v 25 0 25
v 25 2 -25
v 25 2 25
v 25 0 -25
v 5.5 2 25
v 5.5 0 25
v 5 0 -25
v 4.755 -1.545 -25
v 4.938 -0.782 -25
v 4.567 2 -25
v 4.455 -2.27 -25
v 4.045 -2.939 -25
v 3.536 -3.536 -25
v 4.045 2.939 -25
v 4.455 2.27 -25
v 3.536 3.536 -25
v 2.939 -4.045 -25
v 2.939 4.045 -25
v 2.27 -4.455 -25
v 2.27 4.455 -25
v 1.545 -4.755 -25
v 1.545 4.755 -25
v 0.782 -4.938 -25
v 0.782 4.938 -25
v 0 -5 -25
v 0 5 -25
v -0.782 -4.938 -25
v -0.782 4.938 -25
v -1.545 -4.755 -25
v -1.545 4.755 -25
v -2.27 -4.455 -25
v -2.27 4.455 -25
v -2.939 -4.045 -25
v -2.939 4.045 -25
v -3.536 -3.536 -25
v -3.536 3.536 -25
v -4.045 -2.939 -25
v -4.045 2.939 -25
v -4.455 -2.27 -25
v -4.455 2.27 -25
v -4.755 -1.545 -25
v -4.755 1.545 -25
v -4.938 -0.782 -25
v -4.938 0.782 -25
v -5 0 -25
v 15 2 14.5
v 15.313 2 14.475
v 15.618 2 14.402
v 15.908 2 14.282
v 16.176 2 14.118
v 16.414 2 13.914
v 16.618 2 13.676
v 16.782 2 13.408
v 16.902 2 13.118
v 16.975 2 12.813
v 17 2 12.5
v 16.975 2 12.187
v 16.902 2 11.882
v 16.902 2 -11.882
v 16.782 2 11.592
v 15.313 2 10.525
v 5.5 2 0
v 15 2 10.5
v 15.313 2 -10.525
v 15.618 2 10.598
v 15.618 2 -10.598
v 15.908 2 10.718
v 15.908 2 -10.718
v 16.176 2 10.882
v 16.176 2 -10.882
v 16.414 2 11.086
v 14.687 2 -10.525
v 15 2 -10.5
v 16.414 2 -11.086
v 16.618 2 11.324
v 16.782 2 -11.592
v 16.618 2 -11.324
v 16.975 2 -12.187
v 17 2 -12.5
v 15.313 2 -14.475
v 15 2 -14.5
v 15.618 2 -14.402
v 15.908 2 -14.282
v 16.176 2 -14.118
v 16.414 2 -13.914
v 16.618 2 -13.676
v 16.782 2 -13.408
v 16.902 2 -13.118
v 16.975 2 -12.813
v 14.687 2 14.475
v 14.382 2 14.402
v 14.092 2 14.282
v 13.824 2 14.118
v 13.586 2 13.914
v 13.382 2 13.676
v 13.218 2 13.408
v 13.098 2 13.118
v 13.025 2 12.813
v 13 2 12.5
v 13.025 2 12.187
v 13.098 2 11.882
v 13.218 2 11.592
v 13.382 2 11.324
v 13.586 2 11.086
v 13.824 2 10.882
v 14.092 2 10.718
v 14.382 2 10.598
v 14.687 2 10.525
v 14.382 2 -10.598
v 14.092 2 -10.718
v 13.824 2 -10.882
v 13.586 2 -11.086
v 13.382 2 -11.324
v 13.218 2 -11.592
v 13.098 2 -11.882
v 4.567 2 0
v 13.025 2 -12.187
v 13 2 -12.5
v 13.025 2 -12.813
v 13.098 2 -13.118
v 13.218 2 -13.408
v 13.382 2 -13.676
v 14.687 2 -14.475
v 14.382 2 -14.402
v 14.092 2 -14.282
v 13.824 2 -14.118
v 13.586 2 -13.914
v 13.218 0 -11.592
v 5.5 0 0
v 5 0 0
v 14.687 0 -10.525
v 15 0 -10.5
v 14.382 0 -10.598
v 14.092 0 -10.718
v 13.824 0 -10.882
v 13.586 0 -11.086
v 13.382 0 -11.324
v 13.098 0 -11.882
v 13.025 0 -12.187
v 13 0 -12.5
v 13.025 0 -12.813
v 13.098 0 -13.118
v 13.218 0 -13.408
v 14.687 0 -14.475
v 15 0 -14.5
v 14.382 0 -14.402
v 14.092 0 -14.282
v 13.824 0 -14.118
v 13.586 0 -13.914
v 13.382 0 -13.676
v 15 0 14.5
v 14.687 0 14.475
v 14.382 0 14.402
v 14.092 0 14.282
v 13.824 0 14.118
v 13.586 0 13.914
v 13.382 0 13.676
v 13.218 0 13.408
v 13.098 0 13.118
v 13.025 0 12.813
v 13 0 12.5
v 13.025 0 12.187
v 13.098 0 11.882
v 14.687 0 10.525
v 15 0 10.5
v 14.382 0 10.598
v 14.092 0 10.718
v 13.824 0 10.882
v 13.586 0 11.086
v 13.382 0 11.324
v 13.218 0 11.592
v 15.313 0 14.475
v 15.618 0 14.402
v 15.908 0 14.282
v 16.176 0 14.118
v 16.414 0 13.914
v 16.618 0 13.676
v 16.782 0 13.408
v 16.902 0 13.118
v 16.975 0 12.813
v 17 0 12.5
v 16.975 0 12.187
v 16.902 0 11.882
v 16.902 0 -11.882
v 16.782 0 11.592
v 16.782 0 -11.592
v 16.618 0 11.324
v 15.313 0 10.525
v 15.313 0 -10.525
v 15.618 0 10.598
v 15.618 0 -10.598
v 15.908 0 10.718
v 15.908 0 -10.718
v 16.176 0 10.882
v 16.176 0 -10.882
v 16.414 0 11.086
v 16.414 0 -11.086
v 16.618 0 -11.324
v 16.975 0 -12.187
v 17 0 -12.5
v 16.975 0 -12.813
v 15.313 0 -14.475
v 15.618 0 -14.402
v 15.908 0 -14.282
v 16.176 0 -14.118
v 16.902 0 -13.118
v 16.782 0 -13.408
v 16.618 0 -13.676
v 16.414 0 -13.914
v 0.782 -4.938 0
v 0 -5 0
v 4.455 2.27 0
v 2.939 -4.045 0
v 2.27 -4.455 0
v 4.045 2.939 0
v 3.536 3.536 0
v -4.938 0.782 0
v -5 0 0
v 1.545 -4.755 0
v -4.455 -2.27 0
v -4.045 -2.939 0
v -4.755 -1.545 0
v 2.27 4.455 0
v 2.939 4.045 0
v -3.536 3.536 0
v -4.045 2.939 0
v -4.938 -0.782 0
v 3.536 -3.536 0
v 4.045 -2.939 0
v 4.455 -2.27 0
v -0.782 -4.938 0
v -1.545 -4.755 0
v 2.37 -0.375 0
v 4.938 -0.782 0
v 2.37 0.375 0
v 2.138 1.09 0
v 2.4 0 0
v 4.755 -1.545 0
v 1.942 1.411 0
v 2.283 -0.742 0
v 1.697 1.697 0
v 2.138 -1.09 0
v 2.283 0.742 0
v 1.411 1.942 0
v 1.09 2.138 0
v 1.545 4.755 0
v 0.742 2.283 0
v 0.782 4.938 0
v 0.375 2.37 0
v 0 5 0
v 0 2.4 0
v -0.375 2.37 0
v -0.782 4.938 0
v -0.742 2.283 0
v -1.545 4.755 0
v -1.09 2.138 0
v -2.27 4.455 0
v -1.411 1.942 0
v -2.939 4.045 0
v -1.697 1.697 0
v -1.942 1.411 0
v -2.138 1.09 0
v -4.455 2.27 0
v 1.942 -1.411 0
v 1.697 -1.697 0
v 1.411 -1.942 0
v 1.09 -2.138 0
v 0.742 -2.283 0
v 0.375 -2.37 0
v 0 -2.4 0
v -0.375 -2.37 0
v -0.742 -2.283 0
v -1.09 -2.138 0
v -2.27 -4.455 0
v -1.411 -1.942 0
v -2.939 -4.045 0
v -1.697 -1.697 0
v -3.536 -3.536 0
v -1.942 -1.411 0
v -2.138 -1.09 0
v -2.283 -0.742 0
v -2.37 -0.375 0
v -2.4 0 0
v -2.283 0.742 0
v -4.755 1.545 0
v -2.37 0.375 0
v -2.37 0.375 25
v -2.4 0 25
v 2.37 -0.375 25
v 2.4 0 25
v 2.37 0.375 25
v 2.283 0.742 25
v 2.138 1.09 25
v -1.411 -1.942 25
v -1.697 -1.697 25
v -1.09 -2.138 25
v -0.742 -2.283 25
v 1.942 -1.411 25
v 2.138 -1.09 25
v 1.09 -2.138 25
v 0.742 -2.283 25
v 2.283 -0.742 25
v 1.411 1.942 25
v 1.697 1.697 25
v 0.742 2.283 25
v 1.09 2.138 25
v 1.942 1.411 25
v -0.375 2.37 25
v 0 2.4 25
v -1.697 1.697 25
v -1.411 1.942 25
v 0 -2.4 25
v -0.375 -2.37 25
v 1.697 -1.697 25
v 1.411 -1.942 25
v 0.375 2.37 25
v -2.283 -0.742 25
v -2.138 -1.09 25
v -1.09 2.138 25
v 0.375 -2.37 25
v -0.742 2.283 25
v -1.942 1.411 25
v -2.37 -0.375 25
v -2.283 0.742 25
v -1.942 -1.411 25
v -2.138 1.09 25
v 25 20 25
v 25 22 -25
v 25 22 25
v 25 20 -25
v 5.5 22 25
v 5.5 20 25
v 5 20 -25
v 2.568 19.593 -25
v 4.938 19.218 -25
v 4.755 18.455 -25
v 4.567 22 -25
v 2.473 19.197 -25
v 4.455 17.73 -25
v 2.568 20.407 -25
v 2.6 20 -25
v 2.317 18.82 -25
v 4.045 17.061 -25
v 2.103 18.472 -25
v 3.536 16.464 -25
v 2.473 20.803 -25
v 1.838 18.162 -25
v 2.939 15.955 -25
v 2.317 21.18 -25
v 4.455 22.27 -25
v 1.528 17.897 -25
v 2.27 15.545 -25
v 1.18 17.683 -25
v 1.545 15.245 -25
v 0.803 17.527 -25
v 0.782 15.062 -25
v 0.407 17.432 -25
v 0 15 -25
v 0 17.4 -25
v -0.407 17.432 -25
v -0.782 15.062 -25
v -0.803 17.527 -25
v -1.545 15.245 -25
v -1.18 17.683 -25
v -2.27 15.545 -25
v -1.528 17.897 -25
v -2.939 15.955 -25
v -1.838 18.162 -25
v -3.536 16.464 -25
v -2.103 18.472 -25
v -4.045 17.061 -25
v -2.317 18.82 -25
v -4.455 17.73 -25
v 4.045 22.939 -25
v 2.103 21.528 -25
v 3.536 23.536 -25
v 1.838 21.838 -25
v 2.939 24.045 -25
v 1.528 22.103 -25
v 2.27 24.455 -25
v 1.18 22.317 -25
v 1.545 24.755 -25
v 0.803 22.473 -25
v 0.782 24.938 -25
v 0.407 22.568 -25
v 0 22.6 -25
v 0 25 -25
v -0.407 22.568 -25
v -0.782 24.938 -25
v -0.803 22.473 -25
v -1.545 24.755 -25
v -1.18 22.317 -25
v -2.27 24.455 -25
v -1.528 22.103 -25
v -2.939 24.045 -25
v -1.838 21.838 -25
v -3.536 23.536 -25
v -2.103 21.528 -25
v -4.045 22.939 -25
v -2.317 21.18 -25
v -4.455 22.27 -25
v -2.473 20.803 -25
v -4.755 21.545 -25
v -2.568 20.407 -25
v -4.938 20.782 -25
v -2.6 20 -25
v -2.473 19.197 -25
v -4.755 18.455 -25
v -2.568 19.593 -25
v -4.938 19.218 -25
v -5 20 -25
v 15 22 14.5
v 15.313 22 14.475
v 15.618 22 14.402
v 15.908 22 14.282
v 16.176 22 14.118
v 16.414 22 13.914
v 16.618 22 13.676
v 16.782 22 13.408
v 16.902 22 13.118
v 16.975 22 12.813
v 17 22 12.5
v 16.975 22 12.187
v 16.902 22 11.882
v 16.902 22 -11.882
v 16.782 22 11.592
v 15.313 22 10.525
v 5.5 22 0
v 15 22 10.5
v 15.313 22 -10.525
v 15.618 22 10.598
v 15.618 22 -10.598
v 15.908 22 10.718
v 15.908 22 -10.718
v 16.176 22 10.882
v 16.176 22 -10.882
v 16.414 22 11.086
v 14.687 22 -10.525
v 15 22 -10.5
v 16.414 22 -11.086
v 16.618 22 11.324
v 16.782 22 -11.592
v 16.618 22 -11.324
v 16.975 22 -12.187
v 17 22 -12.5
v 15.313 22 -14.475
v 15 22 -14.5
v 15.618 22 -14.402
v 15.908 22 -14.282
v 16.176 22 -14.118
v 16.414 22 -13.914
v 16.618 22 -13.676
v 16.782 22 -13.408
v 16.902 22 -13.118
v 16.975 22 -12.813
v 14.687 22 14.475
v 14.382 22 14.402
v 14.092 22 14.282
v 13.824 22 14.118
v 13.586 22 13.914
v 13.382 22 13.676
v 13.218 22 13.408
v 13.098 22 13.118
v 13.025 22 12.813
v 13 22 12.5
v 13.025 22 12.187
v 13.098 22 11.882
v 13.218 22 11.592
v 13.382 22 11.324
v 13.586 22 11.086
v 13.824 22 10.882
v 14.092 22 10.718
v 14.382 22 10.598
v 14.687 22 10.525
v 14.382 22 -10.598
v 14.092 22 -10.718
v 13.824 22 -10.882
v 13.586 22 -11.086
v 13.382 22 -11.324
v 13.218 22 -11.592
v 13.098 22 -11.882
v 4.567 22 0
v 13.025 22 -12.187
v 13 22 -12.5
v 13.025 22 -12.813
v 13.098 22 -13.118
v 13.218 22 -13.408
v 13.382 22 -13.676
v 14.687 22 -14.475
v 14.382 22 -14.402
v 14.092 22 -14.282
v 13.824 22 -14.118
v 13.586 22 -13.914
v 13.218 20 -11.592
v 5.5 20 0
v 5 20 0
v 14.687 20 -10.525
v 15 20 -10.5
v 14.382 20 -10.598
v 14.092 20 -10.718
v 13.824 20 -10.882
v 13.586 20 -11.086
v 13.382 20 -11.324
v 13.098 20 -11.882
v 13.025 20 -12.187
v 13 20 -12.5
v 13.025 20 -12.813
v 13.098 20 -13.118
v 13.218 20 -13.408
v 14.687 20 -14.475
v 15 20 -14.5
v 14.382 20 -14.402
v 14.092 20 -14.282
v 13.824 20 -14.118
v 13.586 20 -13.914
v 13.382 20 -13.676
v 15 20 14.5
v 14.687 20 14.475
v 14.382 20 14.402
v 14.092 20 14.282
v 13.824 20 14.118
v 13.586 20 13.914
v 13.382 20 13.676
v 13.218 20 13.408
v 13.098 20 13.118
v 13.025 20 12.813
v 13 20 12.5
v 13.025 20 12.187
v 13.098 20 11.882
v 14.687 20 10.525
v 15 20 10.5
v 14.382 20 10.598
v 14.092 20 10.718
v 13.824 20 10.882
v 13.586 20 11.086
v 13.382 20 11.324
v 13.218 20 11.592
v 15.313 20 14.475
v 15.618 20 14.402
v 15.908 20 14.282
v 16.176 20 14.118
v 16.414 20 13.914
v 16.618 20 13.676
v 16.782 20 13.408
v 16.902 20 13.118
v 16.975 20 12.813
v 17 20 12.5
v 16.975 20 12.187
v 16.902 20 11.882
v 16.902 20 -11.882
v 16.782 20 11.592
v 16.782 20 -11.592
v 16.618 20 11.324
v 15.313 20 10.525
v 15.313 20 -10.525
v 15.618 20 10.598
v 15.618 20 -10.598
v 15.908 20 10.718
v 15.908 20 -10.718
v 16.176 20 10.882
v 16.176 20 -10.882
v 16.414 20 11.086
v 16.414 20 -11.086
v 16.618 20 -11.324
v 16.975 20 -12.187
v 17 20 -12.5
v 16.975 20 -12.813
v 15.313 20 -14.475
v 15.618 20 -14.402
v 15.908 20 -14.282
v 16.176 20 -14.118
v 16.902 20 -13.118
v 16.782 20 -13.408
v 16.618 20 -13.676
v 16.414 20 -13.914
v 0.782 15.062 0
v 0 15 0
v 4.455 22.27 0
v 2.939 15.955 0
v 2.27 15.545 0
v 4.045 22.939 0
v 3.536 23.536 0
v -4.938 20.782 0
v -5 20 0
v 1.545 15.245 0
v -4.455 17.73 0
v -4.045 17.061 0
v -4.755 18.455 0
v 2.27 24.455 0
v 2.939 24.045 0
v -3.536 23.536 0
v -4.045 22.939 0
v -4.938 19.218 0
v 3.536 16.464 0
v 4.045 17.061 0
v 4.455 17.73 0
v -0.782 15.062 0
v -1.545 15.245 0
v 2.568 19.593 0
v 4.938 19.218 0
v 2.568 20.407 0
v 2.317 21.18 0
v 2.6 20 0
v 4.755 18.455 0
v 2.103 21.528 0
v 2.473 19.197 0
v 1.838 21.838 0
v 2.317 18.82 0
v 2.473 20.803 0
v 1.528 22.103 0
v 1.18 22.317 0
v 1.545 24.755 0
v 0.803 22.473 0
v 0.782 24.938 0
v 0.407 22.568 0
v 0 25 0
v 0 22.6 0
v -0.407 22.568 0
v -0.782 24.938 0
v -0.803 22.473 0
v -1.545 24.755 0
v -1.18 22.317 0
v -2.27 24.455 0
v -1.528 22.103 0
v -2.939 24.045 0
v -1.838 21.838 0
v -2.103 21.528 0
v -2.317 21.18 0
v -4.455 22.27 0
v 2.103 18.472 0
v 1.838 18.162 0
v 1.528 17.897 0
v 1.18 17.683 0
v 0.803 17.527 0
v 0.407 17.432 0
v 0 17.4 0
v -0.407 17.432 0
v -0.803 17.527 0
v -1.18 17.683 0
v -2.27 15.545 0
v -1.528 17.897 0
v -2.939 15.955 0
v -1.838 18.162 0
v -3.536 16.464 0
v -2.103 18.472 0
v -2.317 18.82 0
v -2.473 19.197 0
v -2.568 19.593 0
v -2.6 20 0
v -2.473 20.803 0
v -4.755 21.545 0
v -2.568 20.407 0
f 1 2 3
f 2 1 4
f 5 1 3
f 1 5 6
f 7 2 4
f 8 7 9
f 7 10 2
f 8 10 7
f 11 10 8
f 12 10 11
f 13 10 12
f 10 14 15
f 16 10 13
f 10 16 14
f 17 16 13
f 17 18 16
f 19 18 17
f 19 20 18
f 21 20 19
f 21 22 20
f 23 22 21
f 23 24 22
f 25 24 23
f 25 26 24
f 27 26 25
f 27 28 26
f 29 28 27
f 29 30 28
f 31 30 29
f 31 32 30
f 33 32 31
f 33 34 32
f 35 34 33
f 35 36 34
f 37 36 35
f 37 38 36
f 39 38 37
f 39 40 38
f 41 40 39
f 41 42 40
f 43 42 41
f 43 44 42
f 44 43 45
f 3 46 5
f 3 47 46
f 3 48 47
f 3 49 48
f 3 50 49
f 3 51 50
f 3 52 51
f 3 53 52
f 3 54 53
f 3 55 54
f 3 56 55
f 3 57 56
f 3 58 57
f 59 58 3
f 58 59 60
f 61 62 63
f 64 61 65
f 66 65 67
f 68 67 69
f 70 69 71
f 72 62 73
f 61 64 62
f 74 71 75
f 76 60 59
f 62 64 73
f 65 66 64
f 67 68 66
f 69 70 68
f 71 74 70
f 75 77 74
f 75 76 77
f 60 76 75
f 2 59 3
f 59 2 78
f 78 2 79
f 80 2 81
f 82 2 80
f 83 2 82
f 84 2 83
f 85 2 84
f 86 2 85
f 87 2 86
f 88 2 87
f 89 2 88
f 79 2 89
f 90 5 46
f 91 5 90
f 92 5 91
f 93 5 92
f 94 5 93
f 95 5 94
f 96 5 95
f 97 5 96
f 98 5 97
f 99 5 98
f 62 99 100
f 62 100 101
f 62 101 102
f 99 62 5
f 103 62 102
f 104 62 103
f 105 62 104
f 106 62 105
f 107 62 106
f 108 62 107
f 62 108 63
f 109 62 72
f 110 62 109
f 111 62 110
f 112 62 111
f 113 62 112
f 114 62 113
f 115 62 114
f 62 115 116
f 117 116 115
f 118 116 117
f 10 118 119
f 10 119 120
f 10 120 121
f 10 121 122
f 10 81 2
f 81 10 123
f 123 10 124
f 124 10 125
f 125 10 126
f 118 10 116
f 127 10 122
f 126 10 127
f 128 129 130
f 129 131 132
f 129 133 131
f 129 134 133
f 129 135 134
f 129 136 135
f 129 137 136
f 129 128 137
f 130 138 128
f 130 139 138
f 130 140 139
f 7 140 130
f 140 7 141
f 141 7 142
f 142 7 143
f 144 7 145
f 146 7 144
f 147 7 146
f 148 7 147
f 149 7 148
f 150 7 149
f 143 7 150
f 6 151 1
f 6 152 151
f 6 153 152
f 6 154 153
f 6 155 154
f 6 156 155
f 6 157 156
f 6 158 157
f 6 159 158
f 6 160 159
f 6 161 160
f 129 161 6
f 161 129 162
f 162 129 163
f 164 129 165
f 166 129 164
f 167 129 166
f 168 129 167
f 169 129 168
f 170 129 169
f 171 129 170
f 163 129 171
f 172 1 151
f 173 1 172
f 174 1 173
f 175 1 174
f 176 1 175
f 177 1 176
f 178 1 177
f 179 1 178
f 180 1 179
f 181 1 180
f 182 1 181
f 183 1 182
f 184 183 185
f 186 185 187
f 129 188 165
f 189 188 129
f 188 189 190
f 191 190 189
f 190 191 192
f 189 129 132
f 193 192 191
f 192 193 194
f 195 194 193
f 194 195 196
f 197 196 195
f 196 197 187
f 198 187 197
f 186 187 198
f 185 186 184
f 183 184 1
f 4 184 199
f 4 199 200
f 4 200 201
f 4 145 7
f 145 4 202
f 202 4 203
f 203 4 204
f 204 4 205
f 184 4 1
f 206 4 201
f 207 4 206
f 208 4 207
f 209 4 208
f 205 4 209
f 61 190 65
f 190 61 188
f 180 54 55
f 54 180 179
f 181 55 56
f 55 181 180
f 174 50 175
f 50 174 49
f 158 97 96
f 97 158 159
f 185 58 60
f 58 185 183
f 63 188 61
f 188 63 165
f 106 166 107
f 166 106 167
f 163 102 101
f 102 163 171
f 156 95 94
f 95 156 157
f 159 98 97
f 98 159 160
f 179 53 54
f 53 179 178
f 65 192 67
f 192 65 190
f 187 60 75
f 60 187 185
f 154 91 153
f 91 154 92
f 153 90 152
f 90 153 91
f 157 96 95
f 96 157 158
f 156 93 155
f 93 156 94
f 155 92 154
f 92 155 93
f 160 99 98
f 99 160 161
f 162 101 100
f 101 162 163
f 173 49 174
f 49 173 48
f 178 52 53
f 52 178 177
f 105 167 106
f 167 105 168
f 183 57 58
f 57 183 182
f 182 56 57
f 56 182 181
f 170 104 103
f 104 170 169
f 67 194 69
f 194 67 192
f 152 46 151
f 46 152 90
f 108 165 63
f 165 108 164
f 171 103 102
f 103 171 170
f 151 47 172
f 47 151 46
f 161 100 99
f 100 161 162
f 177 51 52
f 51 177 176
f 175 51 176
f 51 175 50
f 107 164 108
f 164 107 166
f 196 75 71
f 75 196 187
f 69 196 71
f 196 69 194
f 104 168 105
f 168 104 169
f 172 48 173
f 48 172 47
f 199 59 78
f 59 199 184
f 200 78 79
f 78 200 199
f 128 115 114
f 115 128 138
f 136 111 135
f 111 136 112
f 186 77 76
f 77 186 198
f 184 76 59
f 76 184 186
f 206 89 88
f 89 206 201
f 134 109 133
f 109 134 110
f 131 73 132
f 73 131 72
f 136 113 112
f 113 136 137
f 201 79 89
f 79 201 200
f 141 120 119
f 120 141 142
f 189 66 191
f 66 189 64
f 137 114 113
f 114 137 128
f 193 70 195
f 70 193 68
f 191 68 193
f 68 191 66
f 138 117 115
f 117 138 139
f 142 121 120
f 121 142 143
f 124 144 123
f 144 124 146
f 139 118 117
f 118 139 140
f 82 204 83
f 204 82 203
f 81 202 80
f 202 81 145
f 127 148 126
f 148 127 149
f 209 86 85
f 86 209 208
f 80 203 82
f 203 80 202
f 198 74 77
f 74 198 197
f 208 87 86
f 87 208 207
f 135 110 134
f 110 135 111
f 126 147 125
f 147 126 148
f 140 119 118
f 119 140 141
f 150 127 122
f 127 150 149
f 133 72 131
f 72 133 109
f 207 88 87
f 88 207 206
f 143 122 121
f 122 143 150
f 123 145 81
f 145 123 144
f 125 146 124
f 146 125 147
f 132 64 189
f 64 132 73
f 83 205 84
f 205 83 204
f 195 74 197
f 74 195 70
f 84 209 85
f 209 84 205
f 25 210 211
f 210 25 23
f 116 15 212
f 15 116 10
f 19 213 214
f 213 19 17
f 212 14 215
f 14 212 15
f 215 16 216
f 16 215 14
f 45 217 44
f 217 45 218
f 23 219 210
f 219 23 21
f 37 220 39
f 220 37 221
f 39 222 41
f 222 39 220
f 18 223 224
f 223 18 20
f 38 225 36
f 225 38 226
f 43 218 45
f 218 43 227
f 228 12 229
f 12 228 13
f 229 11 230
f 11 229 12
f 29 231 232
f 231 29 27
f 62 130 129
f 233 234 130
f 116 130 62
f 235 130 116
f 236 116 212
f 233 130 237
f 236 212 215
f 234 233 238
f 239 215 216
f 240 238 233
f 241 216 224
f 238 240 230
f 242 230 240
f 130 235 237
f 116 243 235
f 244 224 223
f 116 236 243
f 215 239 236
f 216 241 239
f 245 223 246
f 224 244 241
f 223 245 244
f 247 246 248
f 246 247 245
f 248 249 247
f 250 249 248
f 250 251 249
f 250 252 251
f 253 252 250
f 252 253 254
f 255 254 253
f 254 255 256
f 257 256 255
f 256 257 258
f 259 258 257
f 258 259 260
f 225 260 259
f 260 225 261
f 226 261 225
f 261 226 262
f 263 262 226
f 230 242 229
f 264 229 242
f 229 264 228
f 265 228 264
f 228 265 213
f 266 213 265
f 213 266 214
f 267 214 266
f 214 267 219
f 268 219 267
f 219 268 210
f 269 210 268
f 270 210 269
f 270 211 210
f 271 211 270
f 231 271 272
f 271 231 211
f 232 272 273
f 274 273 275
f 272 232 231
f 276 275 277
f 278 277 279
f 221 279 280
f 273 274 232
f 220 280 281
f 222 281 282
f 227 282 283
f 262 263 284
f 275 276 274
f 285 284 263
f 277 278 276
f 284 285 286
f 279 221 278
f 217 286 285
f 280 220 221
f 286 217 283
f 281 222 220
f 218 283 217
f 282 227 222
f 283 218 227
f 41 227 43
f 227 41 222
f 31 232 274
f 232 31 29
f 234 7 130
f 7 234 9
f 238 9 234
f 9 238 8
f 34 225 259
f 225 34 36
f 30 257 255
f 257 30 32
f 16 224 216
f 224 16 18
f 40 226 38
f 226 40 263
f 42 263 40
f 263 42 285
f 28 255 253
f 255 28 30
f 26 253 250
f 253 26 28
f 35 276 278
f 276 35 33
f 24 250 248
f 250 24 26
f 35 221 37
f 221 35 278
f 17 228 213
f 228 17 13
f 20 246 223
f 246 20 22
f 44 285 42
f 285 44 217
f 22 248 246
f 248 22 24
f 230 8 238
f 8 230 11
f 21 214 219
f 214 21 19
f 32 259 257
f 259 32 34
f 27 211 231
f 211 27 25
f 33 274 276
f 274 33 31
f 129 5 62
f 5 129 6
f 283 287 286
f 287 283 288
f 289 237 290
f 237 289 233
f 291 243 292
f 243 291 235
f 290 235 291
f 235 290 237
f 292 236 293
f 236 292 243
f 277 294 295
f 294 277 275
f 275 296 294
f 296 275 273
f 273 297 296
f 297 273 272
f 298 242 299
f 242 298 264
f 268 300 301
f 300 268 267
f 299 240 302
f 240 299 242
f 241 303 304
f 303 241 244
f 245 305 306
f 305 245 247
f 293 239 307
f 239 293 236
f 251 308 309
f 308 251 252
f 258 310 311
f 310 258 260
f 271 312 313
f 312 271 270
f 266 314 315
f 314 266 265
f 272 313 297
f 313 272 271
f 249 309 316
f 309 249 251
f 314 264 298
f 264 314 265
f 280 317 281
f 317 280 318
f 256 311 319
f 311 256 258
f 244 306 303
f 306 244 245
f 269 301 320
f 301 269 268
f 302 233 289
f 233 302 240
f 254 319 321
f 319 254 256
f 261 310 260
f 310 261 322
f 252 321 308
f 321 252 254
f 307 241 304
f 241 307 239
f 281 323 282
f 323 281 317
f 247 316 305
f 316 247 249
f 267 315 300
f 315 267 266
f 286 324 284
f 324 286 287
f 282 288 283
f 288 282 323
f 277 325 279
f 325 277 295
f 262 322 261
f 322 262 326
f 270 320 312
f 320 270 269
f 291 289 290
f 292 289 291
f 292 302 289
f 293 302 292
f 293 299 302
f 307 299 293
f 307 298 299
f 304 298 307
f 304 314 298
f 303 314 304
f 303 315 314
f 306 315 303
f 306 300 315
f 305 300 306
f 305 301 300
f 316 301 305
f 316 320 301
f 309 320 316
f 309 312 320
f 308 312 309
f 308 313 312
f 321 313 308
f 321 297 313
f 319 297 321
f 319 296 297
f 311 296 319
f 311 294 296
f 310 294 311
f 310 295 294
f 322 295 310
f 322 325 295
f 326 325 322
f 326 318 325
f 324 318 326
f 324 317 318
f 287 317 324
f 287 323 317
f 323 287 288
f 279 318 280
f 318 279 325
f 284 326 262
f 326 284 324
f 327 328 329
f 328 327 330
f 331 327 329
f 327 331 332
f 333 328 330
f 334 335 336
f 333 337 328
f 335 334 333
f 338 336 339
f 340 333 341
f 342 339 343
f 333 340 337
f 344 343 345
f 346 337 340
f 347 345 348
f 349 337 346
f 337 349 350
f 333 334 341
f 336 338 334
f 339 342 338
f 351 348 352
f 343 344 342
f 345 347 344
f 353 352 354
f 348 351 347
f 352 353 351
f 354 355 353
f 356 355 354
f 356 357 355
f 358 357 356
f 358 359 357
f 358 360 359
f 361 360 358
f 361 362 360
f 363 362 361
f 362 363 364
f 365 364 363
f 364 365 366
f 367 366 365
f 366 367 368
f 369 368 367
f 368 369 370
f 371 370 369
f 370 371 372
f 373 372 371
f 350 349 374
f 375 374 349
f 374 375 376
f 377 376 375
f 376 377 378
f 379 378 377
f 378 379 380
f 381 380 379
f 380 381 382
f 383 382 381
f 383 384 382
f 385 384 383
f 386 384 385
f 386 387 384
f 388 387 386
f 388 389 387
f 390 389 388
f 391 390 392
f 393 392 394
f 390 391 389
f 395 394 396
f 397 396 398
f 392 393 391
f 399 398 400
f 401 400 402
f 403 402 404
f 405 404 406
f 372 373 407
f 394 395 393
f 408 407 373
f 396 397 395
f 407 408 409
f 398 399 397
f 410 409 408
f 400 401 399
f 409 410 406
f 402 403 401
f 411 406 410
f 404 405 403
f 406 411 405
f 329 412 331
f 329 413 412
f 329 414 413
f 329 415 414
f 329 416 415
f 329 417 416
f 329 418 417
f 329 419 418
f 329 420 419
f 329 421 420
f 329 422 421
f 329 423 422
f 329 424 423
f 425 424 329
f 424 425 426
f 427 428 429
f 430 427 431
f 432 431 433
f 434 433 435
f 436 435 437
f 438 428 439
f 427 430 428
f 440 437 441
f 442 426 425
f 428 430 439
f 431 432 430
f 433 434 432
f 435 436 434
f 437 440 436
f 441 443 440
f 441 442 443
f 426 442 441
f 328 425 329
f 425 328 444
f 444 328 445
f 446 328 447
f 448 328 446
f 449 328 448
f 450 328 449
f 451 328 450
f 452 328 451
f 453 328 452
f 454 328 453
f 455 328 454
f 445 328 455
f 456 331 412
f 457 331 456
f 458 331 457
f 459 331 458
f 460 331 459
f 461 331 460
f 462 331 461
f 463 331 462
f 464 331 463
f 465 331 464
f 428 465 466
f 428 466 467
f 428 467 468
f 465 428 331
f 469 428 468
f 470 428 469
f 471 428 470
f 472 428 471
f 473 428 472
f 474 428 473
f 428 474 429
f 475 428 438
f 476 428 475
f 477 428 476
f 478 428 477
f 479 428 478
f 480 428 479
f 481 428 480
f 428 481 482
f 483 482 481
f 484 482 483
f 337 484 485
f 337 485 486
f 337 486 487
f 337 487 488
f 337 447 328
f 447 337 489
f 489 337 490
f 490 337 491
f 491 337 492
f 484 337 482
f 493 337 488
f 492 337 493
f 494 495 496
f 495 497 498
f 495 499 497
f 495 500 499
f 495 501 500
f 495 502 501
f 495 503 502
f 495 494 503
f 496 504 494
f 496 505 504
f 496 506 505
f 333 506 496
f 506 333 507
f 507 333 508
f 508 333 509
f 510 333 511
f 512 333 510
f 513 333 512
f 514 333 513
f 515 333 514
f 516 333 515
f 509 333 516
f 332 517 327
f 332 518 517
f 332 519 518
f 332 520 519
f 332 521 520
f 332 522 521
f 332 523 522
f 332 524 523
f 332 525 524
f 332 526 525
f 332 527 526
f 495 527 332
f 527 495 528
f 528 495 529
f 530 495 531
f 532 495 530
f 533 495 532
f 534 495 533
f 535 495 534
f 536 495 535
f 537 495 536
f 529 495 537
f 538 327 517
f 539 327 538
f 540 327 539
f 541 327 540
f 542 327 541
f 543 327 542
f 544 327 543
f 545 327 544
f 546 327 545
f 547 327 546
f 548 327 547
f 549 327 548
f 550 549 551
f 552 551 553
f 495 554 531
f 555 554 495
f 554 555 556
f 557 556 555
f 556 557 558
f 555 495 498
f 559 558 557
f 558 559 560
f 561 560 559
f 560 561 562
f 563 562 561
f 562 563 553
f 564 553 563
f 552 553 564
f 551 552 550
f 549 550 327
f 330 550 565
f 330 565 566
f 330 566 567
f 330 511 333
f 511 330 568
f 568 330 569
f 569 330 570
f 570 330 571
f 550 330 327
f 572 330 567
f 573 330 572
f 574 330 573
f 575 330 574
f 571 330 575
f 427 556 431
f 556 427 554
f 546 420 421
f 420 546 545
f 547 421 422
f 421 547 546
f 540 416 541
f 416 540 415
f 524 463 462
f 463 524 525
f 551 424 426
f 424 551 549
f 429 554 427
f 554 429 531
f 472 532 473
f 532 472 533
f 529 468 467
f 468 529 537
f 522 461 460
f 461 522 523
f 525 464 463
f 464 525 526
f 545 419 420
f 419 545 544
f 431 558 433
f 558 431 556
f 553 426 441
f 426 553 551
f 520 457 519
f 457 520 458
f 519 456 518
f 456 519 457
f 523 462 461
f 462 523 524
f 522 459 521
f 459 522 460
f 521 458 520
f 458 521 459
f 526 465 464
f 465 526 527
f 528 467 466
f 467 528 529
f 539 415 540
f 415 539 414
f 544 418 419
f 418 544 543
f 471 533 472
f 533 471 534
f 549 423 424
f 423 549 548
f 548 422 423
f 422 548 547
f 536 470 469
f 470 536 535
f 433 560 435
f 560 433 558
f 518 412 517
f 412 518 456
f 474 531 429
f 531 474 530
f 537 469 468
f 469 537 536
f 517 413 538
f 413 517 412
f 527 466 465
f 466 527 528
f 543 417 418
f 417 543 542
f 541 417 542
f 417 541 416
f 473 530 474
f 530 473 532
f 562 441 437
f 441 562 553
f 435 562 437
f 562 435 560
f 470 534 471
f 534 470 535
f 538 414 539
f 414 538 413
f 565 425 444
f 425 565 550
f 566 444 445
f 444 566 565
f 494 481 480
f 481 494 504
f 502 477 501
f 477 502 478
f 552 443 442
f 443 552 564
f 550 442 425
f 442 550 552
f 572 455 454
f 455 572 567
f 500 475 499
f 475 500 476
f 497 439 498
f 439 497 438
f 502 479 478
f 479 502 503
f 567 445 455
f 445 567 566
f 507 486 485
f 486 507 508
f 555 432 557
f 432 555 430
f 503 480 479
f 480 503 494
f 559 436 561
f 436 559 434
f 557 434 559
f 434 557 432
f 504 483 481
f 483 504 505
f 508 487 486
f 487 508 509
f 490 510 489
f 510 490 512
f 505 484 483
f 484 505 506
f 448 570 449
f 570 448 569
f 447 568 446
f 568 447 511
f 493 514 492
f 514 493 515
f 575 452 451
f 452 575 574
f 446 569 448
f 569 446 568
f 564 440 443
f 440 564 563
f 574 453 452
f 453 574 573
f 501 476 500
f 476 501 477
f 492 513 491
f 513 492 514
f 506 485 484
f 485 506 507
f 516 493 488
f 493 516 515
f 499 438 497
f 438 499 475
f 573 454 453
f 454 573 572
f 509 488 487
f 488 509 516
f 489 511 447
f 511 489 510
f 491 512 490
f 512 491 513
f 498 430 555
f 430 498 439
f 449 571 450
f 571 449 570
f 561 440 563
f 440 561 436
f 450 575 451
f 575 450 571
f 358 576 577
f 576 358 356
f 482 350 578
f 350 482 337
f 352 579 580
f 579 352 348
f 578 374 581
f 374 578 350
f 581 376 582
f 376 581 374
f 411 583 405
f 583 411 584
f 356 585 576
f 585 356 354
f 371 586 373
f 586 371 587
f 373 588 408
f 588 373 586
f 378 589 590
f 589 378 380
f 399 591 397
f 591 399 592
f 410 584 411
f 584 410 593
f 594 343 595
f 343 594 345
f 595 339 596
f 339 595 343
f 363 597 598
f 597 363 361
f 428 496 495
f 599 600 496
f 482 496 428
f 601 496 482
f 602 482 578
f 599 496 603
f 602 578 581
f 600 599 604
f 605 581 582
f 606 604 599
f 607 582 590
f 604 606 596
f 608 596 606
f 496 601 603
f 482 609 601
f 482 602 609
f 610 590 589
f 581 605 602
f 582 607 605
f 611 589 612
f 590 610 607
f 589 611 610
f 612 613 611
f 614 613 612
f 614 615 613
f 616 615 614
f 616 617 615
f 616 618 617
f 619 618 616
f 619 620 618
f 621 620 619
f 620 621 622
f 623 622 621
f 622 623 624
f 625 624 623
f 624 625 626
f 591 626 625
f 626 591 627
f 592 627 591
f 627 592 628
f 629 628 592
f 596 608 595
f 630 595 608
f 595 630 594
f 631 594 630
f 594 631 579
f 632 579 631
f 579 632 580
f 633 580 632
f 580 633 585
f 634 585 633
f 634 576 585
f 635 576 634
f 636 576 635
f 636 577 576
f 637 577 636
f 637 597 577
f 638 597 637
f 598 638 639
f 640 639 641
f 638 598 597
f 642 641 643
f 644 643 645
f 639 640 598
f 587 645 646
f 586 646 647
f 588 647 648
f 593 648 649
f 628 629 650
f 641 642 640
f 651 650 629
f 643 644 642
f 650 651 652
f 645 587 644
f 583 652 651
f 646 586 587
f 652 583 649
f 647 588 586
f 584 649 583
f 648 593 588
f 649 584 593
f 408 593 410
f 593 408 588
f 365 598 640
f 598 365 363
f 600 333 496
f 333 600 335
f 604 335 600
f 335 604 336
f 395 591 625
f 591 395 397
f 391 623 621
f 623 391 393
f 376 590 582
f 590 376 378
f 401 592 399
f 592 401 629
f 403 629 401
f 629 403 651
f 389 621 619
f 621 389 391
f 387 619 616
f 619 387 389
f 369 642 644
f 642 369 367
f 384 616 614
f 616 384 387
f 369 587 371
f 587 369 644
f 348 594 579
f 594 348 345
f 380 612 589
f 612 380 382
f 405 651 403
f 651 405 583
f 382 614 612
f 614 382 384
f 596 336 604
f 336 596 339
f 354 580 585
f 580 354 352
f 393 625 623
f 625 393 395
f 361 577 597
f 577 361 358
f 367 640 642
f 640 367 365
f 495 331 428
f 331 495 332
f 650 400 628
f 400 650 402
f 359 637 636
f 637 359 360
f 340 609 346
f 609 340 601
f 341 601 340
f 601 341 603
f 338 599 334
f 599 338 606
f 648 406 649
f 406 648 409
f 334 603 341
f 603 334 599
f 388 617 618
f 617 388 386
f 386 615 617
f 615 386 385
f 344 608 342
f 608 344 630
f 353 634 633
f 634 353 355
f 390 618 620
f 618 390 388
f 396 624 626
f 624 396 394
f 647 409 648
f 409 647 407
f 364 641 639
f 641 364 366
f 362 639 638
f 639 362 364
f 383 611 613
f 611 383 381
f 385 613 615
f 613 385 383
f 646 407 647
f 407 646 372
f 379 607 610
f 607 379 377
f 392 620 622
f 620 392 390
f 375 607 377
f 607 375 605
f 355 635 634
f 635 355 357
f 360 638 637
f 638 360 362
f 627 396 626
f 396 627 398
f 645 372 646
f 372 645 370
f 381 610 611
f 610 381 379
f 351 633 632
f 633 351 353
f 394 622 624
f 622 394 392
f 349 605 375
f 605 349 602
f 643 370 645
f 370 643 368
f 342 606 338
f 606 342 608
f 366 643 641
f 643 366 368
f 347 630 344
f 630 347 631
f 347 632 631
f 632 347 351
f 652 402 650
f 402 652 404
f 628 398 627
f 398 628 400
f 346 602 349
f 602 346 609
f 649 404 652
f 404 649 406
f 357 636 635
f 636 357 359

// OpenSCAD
// file: hinge-base.scad
// Define module for reusable hinge base
module drawHingeBase(wingWidth, wingHeight, wingDepth, drillRadius, knuckleRadius, notchLength){
  difference(){
    union(){
      translate([wingWidth/2, wingDepth/2, 0]){
        difference(){
          
          // This draws a wing
          cube([wingWidth, wingDepth, wingHeight], center = true);

          // This draws the upper hole drill
          translate([knuckleRadius / 2, 0, wingHeight / 4]){
            wingHoleDrill(wingDepth, drillRadius);
          }

          // This draws the lower hole drill
          translate([knuckleRadius / 2, 0, -wingHeight / 4]){
            wingHoleDrill(wingDepth, drillRadius);
          }
        }
      }
    
      // Draw bottom part of the knuckle
      translate([0, 0, -wingHeight / 4]){
        cylinder(h = wingHeight / 2, r = knuckleRadius, center = true, $fn = 40);
      }
    }

    // Draw the top part of the knuckle that will be used 
    // for biting off a part of the wing.
    translate([0, 0, wingHeight / 4]){
      cube([knuckleRadius * 2 + notchLength, knuckleRadius * 2, wingHeight / 2], center = true);
    }  
  }
}

// Define the reusable drill for the holes in the wing
module wingHoleDrill(wingDepth, drillRadius){
  rotate([90, 0, 0]){
    cylinder(h = wingDepth + 10, r = drillRadius, center = true, $fn = 40);
  }
}

// This function call will be discarded if "use" is used 
// instead of "include". We leave it here to be able to get visual feedback here.
drawHingeBase(25, 50, 2, 2, 5, 1);
// main file
// Parametric 3D-Printable Hinge
// Author:  Krisjanis Rijnieks
// Date:    2015-05-13
// 
// This hinge project consists of two files:
//  - A reusable hinge base file;
//  - This file, that makes a male and 
//    female part out of the hinge base.

// Import modules from hinge base file.
use <hinge-base.scad>

// Define variables, these can be easily changed
// for each next iteration, if fail.
wingWidth = 25;
wingHeight = 50;
wingDepth = 2;

drillRadius = 2;
knuckleRadius = 5;
knuckleInnerRadius = 2.5;

maleFemaleSpacing = 0.2;
notchLength = 1;

// Draw male hinge.
union() {
  drawHingeBase(wingWidth, wingHeight, wingDepth, drillRadius, knuckleRadius, notchLength);
  cylinder(r = knuckleInnerRadius - maleFemaleSpacing / 2, 
           h = wingHeight / 2, $fn = 40);
}

// Draw female hinge.
difference() {
  translate([0, knuckleRadius * 2 + 10, 0]){
    drawHingeBase(wingWidth, wingHeight, wingDepth, drillRadius, knuckleRadius, notchLength);
  }

  translate([0, knuckleRadius * 2 + 10, -wingHeight / 2 - 2]){
    cylinder(r = knuckleInnerRadius + maleFemaleSpacing / 2, 
             h = wingHeight / 2 + 4, $fn = 40);
  }
}
        
